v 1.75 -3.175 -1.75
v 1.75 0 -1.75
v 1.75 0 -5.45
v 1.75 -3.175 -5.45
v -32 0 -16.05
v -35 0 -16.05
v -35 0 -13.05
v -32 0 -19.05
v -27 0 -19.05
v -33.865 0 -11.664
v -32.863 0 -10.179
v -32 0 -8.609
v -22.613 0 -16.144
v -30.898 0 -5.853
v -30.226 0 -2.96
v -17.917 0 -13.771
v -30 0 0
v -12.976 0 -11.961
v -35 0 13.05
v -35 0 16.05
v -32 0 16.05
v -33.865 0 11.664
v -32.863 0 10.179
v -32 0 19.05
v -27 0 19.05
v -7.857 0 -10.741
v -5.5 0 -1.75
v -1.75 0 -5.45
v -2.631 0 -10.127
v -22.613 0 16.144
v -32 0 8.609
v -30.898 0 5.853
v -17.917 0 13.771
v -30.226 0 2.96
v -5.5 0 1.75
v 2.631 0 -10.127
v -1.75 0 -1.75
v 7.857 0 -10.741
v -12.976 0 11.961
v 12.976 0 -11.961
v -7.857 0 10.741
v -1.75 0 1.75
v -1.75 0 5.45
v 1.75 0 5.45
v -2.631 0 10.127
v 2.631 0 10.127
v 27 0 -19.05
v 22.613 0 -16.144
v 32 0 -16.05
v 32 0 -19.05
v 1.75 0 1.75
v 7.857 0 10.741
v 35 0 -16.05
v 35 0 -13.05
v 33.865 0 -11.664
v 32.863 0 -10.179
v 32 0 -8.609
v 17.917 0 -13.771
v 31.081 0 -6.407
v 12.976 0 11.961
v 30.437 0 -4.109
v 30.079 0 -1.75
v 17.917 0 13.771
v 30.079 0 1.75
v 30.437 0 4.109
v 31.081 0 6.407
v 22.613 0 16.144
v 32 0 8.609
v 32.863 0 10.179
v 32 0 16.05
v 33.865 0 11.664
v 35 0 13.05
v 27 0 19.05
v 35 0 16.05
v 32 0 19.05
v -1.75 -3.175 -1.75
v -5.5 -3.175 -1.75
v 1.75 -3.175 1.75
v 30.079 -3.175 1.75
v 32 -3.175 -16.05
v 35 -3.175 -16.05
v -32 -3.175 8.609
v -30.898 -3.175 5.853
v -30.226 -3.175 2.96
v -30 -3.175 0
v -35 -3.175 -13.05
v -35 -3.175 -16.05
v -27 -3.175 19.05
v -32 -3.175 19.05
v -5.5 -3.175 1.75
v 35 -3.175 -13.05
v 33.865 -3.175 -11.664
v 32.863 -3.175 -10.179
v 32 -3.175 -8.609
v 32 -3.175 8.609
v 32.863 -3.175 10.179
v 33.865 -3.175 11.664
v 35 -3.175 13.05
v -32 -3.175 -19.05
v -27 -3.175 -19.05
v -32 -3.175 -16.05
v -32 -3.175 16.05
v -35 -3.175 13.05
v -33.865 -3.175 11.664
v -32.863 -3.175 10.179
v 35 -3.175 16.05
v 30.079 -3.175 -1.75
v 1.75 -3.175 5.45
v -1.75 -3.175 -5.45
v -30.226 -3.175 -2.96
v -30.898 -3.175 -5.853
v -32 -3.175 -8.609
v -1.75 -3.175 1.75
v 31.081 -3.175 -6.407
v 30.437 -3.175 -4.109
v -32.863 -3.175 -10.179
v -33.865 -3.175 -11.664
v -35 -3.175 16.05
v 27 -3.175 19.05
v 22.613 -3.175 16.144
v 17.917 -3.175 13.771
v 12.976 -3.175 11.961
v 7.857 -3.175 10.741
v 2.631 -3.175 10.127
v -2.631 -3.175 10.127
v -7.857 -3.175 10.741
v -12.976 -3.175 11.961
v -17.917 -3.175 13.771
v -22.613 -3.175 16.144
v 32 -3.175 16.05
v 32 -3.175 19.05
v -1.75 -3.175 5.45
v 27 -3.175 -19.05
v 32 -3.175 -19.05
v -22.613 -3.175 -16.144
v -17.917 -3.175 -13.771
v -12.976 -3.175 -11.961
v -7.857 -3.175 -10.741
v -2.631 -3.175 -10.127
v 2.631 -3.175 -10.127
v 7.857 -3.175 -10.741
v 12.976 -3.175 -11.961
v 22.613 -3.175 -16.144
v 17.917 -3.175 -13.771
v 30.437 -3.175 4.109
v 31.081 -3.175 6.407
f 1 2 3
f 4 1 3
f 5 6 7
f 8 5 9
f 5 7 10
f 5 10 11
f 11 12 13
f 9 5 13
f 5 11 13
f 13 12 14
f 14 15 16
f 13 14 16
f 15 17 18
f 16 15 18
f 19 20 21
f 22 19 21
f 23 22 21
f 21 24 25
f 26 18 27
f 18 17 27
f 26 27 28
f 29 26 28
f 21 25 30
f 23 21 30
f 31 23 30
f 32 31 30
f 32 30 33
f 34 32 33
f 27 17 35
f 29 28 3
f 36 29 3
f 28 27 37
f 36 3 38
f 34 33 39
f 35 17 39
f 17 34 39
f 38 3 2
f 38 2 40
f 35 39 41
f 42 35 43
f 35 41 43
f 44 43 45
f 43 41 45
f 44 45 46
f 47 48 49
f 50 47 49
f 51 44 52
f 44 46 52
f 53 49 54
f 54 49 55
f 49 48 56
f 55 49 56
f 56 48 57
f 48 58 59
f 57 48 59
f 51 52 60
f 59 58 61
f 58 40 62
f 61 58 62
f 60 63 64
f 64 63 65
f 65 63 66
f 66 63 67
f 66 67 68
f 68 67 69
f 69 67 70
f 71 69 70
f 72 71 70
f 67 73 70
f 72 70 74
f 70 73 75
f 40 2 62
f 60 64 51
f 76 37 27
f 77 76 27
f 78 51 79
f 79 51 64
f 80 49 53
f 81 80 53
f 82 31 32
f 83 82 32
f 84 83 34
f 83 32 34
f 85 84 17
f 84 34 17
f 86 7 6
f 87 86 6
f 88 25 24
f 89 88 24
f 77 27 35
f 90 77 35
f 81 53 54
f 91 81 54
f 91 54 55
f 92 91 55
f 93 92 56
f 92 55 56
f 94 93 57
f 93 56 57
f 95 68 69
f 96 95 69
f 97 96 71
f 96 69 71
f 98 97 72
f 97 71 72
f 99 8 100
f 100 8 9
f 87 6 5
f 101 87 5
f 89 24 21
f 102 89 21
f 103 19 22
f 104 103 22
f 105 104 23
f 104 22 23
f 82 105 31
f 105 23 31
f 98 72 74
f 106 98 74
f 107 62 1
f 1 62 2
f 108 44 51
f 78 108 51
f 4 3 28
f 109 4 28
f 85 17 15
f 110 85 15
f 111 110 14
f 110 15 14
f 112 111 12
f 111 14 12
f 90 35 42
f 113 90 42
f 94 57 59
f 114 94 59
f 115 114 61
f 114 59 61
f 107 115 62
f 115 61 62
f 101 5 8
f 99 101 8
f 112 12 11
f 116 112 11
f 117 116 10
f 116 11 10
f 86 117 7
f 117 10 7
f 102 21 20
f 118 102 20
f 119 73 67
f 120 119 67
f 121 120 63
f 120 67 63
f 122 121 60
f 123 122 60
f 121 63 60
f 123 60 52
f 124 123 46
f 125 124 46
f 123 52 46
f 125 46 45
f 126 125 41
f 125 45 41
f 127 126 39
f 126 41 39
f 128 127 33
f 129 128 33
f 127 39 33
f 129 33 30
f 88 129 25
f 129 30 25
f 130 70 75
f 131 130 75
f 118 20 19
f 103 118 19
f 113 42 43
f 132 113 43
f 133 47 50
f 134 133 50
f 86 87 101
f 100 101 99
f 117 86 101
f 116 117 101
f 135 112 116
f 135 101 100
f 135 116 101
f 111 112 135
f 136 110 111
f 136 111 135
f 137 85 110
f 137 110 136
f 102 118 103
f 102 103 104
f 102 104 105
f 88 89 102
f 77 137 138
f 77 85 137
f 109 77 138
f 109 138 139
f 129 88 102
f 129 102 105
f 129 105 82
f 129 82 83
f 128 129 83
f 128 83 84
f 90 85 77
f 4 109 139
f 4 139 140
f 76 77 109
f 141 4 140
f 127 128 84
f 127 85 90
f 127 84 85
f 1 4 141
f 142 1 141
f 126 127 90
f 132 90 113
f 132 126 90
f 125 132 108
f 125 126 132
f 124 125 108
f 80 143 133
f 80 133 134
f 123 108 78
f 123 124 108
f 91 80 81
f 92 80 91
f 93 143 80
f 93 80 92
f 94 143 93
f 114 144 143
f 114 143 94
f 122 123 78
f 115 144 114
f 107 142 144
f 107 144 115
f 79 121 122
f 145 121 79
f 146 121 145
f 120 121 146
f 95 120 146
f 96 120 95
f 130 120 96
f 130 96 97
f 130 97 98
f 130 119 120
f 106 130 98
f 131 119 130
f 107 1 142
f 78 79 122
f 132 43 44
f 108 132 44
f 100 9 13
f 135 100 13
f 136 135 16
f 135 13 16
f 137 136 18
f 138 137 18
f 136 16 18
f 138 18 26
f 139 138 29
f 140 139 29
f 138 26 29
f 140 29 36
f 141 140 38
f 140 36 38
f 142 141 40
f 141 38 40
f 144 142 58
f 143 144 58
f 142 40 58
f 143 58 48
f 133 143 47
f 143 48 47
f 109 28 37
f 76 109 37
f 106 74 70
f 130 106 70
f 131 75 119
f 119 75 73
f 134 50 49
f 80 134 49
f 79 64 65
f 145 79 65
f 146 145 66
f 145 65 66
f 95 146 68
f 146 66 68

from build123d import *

# Parameters (mm, degrees)
F1_DEPTH = 3.175


# Not quite as in the source:
# - a length typed as a fraction of an inch, garbled in the dataset ("3 / 203.2 mm" for 3/8 in), is restored


with BuildPart() as f1:
    # F0 (on Front) → F1 (new body)
    with BuildSketch(Plane.XZ):
        with BuildLine():
            Line((32, -16.05), (35, -16.05))
            Line((35, -16.05), (35, -13.05))
            ThreePointArc((35, -13.05), (33.3469639854, -10.9330653905), (32, -8.6093553766))
            Line((32, -8.6093553766), (32, -16.05))
        make_face()
        with BuildLine():
            ThreePointArc((32, 8.6093553766), (33.3469639854, 10.9330653905), (35, 13.05))
            Line((35, 13.05), (35, 16.05))
            Line((35, 16.05), (32, 16.05))
            Line((32, 16.05), (32, 8.6093553766))
        make_face()
        with BuildLine():
            Line((-35, -16.05), (-32, -16.05))
            Line((-32, -16.05), (-32, -8.6093553766))
            ThreePointArc((-32, -8.6093553766), (-33.3469639854, -10.9330653905), (-35, -13.05))
            Line((-35, -13.05), (-35, -16.05))
        make_face()
        with BuildLine():
            Line((27, -19.05), (32, -19.05))
            Line((32, -19.05), (32, -16.05))
            Line((32, -16.05), (32, -8.6093553766))
            ThreePointArc((32, -8.6093553766), (30.7239047108, -5.268020684), (30.0785620254, -1.75))
            Line((30.0785620254, -1.75), (1.75, -1.75))
            Line((1.75, -1.75), (1.75, -5.45))
            Line((1.75, -5.45), (-1.75, -5.45))
            Line((-1.75, -5.45), (-1.75, -1.75))
            Line((-1.75, -1.75), (-5.5, -1.75))
            Line((-5.5, -1.75), (-5.5, 0))
            Line((-5.5, 0), (-30, 0))
            ThreePointArc((-30, 0), (-30.5065696236, -4.4193042439), (-32, -8.6093553766))
            Line((-32, -8.6093553766), (-32, -16.05))
            Line((-32, -16.05), (-32, -19.05))
            Line((-32, -19.05), (-27, -19.05))
            ThreePointArc((-27, -19.05), (0, -10.05), (27, -19.05))
        make_face()
        with BuildLine():
            ThreePointArc((30.0785620254, 1.75), (30.7239047108, 5.268020684), (32, 8.6093553766))
            Line((32, 8.6093553766), (32, 16.05))
            Line((32, 16.05), (32, 19.05))
            Line((32, 19.05), (27, 19.05))
            ThreePointArc((27, 19.05), (0, 10.05), (-27, 19.05))
            Line((-27, 19.05), (-32, 19.05))
            Line((-32, 19.05), (-32, 16.05))
            Line((-32, 16.05), (-32, 8.6093553766))
            ThreePointArc((-32, 8.6093553766), (-30.5065696236, 4.4193042439), (-30, 0))
            Line((-30, 0), (-5.5, 0))
            Line((-5.5, 0), (-5.5, 1.75))
            Line((-5.5, 1.75), (-1.75, 1.75))
            Line((-1.75, 1.75), (-1.75, 5.45))
            Line((-1.75, 5.45), (1.75, 5.45))
            Line((1.75, 5.45), (1.75, 1.75))
            Line((1.75, 1.75), (30.0785620254, 1.75))
        make_face()
        with BuildLine():
            ThreePointArc((-35, 13.05), (-33.3469639854, 10.9330653905), (-32, 8.6093553766))
            Line((-32, 8.6093553766), (-32, 16.05))
            Line((-32, 16.05), (-35, 16.05))
            Line((-35, 16.05), (-35, 13.05))
        make_face()
    extrude(amount=F1_DEPTH)


solid = f1.part
